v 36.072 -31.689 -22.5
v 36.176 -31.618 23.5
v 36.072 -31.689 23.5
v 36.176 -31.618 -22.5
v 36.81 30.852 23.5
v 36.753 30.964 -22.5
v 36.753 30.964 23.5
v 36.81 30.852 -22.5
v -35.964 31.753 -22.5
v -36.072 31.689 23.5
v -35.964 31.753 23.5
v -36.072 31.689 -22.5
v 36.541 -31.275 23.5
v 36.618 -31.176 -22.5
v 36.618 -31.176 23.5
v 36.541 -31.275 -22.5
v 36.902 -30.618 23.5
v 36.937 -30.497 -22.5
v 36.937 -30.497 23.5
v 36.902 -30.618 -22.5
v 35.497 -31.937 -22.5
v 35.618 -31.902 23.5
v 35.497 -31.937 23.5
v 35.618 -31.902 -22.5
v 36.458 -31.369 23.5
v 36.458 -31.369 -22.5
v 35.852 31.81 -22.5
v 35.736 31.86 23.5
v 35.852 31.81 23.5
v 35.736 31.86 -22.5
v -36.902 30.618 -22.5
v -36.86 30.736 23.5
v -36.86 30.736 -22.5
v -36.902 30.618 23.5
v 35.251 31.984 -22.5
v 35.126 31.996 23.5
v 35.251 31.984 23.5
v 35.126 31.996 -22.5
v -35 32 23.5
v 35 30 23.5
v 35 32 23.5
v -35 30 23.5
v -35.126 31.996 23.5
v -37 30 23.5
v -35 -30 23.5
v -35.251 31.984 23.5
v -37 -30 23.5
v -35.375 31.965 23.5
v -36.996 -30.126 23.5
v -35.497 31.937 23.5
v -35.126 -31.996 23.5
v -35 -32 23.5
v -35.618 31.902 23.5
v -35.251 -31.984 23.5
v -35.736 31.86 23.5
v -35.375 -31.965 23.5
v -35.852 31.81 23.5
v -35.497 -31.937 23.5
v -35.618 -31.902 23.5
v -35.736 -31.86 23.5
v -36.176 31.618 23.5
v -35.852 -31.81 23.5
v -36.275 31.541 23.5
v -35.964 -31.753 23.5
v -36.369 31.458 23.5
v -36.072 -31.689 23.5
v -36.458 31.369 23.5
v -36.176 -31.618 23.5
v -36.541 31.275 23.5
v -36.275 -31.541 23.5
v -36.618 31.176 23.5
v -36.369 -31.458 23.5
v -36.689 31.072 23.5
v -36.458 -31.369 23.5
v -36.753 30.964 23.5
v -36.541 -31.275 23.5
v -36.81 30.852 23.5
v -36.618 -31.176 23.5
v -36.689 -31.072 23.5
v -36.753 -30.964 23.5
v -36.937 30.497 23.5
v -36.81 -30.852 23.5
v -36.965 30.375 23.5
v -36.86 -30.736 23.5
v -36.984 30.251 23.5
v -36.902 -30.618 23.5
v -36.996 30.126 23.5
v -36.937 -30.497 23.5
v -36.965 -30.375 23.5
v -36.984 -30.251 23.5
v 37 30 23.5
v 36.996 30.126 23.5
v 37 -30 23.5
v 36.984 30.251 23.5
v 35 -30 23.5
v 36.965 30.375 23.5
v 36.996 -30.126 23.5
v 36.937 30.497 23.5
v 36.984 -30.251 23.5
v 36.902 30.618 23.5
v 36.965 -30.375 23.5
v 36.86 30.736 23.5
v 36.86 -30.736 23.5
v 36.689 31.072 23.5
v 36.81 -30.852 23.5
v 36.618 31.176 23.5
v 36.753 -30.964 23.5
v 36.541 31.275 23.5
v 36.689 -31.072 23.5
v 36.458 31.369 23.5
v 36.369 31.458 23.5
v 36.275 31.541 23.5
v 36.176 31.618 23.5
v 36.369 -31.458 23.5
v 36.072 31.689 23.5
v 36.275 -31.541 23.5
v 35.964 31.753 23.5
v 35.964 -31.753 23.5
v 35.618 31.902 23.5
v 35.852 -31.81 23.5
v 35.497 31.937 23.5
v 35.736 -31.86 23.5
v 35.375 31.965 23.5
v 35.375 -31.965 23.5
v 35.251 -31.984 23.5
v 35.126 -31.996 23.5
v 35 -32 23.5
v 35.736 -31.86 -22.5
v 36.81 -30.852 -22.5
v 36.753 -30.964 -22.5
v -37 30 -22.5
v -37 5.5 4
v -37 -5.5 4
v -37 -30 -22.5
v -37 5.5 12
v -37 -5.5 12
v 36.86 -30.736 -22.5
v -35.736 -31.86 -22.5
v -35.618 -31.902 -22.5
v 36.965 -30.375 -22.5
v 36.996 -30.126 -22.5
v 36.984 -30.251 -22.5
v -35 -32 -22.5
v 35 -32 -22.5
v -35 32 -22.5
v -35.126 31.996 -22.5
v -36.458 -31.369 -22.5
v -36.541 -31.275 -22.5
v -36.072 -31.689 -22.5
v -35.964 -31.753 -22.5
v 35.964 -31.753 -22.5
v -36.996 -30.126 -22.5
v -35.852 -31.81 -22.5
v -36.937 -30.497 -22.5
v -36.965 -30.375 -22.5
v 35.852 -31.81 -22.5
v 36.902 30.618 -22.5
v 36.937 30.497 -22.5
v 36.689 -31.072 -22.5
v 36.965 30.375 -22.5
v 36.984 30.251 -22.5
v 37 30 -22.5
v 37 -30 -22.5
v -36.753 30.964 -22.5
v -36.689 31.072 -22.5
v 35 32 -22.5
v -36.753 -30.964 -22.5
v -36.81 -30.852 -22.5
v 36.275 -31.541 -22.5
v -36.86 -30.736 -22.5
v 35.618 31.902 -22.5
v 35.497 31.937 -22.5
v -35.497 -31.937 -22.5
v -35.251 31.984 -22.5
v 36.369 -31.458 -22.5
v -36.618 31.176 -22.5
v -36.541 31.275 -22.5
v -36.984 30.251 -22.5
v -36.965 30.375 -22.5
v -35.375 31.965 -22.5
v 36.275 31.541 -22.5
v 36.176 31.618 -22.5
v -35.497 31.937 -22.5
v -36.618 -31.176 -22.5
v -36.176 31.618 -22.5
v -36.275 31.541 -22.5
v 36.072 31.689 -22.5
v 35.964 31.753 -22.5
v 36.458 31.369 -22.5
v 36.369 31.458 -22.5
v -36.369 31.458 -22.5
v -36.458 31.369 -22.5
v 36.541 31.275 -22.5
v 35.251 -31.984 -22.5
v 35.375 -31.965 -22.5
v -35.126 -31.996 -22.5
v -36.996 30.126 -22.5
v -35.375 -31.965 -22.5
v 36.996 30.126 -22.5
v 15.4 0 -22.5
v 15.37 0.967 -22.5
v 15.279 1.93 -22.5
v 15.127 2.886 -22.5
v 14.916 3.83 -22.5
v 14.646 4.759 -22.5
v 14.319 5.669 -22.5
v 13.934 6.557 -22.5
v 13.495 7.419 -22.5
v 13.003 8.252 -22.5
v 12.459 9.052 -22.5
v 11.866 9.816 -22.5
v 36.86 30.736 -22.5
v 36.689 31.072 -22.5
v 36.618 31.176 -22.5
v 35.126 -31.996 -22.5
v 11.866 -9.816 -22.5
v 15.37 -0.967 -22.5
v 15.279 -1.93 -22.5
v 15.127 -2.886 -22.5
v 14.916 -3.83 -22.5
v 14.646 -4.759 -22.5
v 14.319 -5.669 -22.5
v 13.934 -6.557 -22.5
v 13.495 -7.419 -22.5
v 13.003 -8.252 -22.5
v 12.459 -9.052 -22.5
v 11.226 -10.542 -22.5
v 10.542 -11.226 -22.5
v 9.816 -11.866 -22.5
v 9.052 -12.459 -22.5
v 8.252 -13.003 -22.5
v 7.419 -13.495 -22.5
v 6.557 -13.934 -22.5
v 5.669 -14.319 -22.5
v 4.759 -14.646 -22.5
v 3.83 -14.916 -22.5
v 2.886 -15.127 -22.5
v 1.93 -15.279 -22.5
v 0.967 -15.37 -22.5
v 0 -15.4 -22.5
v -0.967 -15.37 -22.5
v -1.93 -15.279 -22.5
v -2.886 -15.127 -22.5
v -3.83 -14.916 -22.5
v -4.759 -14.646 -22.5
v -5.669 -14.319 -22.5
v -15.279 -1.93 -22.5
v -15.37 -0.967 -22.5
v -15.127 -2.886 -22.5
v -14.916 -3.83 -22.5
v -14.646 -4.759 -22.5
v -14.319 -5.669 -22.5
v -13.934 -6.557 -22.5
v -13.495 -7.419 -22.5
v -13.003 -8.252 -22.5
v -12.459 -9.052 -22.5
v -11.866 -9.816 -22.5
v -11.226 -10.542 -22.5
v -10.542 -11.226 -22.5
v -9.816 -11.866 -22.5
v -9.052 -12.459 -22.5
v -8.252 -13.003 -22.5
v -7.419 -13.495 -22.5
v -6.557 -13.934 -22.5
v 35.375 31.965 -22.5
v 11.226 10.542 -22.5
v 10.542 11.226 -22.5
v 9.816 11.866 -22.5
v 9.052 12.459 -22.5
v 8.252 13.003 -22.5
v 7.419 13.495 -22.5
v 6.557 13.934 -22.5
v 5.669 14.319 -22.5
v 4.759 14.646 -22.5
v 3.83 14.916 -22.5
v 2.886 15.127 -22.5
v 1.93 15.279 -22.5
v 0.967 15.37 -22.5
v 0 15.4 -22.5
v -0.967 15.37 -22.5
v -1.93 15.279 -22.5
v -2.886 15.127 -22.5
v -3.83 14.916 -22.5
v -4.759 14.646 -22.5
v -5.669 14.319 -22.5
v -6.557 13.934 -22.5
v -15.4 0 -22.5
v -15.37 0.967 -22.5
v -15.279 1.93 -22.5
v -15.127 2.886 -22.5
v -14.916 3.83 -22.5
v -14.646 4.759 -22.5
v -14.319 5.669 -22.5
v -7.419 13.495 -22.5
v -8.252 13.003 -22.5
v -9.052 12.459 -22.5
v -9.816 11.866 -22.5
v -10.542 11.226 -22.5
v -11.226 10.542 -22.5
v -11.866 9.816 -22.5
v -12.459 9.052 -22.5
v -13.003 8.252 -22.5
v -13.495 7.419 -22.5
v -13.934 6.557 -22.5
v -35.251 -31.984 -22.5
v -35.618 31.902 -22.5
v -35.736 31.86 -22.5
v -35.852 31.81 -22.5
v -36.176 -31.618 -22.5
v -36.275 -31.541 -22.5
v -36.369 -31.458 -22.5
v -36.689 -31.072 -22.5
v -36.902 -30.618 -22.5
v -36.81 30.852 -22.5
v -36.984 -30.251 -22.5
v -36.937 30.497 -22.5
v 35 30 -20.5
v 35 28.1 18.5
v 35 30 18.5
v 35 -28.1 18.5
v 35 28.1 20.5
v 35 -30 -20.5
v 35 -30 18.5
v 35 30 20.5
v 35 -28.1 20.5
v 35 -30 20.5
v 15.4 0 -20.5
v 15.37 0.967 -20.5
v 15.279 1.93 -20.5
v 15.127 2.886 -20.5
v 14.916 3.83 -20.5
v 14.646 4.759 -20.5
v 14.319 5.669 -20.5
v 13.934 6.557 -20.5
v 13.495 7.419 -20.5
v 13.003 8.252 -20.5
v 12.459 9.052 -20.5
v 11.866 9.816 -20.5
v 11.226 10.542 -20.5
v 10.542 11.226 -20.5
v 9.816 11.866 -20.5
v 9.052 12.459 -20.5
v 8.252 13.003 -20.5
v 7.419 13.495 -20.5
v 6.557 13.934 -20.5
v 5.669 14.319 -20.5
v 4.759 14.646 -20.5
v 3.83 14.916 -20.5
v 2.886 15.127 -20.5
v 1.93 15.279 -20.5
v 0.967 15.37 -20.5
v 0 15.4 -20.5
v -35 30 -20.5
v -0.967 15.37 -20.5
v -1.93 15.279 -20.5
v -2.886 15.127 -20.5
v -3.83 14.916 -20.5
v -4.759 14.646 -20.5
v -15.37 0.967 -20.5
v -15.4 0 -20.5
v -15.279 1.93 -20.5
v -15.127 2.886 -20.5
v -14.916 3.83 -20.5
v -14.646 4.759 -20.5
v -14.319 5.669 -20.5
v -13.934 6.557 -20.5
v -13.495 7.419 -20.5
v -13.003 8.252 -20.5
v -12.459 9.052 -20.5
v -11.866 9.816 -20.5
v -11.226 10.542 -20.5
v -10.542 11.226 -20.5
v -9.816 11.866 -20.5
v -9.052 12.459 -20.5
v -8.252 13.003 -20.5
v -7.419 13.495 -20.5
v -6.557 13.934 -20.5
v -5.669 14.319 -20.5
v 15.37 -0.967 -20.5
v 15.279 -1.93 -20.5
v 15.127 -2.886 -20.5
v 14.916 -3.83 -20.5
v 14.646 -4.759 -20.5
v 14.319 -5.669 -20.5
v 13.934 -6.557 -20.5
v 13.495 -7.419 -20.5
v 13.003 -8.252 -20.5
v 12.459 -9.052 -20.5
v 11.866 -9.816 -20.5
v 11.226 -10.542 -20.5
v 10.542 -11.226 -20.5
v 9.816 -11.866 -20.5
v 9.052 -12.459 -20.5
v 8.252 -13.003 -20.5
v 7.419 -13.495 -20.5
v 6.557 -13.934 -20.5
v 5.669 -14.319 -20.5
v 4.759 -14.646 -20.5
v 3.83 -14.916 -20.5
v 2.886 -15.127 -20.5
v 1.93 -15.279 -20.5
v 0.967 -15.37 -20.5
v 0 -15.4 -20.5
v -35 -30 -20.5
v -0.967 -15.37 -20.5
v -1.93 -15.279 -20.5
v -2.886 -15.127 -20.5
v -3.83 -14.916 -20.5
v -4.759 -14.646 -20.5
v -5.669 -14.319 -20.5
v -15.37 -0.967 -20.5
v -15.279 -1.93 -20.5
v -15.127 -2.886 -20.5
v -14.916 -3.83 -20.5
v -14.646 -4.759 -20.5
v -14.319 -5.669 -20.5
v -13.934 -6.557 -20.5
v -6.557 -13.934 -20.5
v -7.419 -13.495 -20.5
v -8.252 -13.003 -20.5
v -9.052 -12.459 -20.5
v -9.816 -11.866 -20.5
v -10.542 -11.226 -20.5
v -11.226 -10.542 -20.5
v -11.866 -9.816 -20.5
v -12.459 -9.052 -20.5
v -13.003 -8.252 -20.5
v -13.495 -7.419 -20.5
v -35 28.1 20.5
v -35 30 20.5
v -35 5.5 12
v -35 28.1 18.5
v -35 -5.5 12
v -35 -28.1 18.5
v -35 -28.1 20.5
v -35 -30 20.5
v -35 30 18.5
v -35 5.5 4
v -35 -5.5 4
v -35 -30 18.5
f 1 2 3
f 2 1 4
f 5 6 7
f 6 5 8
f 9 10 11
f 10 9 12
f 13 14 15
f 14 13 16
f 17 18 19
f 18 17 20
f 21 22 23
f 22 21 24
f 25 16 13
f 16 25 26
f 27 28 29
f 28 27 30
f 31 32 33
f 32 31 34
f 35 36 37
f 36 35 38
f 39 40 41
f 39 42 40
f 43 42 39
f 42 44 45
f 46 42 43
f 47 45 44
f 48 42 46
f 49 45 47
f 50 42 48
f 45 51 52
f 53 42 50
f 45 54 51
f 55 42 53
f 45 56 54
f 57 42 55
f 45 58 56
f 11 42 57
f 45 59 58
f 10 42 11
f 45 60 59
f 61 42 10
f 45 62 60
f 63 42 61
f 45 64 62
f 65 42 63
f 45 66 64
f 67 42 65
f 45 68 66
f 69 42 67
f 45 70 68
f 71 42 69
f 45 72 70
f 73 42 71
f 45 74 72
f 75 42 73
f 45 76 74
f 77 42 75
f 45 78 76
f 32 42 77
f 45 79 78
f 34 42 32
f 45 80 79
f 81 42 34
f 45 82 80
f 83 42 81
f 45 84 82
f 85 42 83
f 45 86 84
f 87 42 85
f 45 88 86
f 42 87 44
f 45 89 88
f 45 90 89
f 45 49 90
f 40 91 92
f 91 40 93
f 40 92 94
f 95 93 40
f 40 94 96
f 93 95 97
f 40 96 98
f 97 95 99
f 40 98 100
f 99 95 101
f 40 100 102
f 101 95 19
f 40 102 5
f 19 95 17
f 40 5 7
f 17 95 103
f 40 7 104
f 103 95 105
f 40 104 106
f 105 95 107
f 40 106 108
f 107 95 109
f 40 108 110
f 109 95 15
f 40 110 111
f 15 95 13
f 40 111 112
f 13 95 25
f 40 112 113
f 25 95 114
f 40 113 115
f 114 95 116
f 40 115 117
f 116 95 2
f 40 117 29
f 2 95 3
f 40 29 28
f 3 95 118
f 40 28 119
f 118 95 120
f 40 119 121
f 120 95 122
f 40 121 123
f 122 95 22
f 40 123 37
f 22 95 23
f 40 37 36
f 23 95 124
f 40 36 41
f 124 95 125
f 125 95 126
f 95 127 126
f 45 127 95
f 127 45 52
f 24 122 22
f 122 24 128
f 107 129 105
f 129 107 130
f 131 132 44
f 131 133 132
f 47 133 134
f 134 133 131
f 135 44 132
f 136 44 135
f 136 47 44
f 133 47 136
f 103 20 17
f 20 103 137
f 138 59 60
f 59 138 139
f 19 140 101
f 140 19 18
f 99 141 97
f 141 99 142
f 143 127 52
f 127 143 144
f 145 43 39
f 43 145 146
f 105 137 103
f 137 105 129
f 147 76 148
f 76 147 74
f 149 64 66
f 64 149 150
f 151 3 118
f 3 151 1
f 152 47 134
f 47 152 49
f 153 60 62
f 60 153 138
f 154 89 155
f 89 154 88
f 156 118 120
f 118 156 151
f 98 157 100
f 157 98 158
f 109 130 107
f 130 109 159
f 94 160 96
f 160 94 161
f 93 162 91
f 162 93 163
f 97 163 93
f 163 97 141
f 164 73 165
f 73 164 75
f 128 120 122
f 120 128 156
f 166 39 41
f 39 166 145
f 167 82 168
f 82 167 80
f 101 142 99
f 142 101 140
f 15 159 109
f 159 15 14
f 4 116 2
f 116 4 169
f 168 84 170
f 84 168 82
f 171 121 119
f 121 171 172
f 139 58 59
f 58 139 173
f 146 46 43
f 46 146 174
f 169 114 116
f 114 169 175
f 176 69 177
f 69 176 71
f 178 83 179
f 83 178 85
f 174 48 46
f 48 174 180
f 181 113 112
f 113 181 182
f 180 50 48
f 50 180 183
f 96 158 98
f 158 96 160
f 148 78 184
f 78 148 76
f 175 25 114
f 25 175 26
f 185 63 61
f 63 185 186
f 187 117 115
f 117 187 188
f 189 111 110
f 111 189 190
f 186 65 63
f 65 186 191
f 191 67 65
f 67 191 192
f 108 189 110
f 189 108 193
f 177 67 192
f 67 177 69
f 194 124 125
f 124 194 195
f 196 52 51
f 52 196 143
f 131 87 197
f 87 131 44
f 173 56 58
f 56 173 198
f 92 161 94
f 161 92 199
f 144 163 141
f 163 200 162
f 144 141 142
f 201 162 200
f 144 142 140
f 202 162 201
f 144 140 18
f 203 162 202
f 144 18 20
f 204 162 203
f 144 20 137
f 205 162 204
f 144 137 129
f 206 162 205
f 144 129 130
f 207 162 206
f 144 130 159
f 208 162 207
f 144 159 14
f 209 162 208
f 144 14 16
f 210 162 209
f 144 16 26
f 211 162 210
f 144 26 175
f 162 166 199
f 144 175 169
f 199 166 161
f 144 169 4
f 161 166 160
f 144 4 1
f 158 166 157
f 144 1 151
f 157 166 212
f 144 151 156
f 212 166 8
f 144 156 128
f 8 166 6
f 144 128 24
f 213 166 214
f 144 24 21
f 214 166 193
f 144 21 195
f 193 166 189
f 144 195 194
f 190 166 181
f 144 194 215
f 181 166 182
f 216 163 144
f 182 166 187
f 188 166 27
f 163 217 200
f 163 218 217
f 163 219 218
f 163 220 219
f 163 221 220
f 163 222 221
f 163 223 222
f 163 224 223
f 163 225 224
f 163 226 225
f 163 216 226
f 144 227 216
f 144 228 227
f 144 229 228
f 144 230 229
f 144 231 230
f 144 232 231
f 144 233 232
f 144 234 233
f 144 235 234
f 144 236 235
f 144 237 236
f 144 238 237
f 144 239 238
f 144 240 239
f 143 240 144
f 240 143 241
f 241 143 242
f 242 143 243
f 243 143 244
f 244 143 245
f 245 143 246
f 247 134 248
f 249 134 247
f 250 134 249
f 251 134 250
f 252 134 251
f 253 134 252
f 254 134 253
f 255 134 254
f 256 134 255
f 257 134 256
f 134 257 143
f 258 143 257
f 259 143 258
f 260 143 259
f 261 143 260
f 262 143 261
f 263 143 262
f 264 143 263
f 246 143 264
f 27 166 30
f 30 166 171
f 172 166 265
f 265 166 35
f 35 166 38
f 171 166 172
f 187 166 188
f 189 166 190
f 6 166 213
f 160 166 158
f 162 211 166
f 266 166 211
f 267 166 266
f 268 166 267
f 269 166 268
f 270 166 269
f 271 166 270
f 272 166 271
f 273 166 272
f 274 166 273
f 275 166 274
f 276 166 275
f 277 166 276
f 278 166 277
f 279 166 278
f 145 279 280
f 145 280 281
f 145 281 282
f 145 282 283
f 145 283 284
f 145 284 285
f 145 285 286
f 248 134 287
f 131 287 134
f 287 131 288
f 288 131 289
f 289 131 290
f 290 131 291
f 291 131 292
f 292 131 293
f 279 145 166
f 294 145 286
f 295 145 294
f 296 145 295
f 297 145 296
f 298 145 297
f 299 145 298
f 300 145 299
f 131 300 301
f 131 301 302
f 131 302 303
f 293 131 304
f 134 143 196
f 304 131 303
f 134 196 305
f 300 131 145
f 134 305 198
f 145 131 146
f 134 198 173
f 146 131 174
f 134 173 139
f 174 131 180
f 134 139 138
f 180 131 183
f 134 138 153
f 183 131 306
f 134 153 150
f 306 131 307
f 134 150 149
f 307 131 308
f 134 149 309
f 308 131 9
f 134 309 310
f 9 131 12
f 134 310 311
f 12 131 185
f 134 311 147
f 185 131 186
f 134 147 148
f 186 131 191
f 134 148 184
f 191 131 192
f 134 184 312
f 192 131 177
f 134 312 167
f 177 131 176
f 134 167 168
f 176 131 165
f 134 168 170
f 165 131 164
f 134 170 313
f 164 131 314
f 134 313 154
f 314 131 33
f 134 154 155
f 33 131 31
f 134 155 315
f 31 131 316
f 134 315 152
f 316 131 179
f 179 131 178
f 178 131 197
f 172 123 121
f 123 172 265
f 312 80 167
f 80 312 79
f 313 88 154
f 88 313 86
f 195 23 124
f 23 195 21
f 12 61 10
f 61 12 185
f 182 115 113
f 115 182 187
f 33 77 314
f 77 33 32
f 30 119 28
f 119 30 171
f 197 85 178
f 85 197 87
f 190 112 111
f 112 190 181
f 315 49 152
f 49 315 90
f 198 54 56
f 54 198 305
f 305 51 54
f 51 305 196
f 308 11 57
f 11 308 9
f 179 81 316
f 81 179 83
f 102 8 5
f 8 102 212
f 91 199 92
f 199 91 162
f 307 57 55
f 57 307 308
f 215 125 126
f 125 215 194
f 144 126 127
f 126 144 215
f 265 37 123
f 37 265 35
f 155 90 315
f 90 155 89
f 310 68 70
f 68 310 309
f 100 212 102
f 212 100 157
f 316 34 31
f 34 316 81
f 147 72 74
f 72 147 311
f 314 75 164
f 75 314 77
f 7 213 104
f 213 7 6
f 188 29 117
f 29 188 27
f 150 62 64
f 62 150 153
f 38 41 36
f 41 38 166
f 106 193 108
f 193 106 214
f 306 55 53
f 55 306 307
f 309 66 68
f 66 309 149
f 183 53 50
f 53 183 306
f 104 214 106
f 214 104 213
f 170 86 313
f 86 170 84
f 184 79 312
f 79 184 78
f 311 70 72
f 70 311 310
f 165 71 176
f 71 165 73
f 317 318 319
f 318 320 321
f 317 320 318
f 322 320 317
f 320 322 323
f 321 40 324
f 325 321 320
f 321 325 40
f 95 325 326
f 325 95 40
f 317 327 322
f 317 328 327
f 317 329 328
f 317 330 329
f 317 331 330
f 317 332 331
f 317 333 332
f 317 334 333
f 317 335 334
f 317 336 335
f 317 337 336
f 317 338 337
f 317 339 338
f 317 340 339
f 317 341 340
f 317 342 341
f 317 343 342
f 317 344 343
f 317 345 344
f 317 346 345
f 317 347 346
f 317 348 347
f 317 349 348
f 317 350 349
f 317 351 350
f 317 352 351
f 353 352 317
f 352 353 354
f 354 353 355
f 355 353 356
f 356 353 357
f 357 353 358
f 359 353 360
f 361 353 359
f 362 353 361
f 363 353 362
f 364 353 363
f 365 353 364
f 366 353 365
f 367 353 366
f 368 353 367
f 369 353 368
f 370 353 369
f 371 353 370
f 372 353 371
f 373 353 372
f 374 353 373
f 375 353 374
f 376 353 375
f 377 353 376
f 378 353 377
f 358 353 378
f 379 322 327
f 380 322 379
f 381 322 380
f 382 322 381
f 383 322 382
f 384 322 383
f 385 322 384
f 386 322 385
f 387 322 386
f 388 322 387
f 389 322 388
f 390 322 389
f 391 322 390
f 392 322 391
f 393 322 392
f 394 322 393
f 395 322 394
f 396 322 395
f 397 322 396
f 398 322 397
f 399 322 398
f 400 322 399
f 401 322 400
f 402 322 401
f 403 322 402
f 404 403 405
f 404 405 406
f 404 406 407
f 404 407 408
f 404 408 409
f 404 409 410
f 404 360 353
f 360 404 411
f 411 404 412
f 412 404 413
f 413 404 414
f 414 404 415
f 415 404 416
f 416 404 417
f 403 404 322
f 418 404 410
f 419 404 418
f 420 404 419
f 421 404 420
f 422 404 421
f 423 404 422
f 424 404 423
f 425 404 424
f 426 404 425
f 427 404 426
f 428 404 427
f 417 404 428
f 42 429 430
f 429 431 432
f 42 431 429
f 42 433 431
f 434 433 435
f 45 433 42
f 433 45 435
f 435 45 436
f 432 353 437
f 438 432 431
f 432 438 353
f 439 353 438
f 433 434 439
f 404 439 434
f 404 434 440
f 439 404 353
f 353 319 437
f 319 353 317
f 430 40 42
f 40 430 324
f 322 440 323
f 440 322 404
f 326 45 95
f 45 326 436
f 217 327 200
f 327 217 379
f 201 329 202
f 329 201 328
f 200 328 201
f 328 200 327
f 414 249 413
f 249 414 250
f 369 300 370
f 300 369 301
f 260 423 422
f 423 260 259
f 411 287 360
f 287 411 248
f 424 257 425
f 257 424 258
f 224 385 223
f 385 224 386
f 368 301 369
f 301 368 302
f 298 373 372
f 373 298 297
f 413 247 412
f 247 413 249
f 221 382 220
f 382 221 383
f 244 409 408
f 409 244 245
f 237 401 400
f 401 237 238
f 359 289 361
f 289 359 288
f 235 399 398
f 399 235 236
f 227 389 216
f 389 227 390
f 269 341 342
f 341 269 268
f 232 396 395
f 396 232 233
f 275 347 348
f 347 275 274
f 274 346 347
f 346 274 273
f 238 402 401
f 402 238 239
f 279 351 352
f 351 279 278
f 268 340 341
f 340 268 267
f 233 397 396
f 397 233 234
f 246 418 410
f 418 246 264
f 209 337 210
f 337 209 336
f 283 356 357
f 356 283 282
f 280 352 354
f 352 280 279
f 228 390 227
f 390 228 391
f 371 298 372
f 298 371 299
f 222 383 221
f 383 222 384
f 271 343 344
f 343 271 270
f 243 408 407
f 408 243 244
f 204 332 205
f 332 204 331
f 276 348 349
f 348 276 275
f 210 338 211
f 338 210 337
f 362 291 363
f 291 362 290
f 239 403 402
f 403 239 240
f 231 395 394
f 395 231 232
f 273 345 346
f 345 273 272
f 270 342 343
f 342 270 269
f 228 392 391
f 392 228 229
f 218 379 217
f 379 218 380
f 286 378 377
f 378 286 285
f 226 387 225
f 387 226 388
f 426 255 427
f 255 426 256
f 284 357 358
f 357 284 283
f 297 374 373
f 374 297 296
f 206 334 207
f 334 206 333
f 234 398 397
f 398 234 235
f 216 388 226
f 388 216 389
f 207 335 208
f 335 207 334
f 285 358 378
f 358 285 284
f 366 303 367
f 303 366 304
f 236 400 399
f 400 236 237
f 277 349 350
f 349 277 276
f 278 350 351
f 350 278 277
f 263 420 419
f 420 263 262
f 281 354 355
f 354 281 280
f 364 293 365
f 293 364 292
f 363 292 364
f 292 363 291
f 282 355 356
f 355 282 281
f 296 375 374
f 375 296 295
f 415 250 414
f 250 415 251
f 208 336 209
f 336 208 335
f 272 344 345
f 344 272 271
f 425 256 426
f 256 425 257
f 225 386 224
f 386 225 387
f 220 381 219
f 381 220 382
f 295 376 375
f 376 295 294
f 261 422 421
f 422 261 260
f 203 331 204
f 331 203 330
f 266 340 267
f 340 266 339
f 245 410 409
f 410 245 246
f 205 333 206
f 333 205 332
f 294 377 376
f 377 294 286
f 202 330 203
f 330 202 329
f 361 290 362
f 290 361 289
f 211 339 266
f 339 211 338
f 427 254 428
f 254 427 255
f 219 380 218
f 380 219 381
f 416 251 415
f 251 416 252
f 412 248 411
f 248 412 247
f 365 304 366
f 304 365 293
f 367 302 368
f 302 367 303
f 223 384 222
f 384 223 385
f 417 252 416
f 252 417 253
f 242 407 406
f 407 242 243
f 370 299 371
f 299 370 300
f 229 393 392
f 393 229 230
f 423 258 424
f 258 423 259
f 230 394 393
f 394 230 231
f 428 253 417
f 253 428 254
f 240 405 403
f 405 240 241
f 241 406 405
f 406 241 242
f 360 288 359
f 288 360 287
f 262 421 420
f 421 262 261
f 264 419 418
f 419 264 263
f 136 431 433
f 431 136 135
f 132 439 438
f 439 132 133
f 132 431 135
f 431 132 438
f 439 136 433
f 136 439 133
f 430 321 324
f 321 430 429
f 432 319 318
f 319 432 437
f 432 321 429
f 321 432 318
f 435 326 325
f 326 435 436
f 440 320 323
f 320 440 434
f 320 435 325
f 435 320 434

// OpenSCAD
largoCaja=70;
anchoCaja=60;
grosorCaja=45;

largoTuerca=70;
anchoTuerca=2;
grosorTuerca=2;

taladroPasante=0;
diametroBoton=0;
tuercaAlojada=0;


union () {
    difference(){
             minkowski() {
                cube([largoCaja,anchoCaja,grosorCaja], center=true);
                cylinder(r=2,h=1, $fn=100);
            }
        
            // Coloco lo que voy a restar 2 mm hacia arriba en Z para que haga de fondo
            translate([0,0,2])
            cube([70, 60, 45], center=true);
            
            // Hueco botón arcade
            translate([0, 0, -20])
            #cylinder (r=15.4, h=10, $fn=100, center=true);
            
            // Hueco USB
            translate([-33,0, 8])
            #cube([18, 11, 8], center=true);
    }


    // Para cierre
    color ("yellow")
    translate([0, 29.1, 19.5])
    cube([largoTuerca, anchoTuerca, grosorTuerca], center=true);
        
    // Para cierre
    color ("yellow")
    translate([0, -29.1, 19.5])
    cube([largoTuerca, anchoTuerca, grosorTuerca], center=true);
}
